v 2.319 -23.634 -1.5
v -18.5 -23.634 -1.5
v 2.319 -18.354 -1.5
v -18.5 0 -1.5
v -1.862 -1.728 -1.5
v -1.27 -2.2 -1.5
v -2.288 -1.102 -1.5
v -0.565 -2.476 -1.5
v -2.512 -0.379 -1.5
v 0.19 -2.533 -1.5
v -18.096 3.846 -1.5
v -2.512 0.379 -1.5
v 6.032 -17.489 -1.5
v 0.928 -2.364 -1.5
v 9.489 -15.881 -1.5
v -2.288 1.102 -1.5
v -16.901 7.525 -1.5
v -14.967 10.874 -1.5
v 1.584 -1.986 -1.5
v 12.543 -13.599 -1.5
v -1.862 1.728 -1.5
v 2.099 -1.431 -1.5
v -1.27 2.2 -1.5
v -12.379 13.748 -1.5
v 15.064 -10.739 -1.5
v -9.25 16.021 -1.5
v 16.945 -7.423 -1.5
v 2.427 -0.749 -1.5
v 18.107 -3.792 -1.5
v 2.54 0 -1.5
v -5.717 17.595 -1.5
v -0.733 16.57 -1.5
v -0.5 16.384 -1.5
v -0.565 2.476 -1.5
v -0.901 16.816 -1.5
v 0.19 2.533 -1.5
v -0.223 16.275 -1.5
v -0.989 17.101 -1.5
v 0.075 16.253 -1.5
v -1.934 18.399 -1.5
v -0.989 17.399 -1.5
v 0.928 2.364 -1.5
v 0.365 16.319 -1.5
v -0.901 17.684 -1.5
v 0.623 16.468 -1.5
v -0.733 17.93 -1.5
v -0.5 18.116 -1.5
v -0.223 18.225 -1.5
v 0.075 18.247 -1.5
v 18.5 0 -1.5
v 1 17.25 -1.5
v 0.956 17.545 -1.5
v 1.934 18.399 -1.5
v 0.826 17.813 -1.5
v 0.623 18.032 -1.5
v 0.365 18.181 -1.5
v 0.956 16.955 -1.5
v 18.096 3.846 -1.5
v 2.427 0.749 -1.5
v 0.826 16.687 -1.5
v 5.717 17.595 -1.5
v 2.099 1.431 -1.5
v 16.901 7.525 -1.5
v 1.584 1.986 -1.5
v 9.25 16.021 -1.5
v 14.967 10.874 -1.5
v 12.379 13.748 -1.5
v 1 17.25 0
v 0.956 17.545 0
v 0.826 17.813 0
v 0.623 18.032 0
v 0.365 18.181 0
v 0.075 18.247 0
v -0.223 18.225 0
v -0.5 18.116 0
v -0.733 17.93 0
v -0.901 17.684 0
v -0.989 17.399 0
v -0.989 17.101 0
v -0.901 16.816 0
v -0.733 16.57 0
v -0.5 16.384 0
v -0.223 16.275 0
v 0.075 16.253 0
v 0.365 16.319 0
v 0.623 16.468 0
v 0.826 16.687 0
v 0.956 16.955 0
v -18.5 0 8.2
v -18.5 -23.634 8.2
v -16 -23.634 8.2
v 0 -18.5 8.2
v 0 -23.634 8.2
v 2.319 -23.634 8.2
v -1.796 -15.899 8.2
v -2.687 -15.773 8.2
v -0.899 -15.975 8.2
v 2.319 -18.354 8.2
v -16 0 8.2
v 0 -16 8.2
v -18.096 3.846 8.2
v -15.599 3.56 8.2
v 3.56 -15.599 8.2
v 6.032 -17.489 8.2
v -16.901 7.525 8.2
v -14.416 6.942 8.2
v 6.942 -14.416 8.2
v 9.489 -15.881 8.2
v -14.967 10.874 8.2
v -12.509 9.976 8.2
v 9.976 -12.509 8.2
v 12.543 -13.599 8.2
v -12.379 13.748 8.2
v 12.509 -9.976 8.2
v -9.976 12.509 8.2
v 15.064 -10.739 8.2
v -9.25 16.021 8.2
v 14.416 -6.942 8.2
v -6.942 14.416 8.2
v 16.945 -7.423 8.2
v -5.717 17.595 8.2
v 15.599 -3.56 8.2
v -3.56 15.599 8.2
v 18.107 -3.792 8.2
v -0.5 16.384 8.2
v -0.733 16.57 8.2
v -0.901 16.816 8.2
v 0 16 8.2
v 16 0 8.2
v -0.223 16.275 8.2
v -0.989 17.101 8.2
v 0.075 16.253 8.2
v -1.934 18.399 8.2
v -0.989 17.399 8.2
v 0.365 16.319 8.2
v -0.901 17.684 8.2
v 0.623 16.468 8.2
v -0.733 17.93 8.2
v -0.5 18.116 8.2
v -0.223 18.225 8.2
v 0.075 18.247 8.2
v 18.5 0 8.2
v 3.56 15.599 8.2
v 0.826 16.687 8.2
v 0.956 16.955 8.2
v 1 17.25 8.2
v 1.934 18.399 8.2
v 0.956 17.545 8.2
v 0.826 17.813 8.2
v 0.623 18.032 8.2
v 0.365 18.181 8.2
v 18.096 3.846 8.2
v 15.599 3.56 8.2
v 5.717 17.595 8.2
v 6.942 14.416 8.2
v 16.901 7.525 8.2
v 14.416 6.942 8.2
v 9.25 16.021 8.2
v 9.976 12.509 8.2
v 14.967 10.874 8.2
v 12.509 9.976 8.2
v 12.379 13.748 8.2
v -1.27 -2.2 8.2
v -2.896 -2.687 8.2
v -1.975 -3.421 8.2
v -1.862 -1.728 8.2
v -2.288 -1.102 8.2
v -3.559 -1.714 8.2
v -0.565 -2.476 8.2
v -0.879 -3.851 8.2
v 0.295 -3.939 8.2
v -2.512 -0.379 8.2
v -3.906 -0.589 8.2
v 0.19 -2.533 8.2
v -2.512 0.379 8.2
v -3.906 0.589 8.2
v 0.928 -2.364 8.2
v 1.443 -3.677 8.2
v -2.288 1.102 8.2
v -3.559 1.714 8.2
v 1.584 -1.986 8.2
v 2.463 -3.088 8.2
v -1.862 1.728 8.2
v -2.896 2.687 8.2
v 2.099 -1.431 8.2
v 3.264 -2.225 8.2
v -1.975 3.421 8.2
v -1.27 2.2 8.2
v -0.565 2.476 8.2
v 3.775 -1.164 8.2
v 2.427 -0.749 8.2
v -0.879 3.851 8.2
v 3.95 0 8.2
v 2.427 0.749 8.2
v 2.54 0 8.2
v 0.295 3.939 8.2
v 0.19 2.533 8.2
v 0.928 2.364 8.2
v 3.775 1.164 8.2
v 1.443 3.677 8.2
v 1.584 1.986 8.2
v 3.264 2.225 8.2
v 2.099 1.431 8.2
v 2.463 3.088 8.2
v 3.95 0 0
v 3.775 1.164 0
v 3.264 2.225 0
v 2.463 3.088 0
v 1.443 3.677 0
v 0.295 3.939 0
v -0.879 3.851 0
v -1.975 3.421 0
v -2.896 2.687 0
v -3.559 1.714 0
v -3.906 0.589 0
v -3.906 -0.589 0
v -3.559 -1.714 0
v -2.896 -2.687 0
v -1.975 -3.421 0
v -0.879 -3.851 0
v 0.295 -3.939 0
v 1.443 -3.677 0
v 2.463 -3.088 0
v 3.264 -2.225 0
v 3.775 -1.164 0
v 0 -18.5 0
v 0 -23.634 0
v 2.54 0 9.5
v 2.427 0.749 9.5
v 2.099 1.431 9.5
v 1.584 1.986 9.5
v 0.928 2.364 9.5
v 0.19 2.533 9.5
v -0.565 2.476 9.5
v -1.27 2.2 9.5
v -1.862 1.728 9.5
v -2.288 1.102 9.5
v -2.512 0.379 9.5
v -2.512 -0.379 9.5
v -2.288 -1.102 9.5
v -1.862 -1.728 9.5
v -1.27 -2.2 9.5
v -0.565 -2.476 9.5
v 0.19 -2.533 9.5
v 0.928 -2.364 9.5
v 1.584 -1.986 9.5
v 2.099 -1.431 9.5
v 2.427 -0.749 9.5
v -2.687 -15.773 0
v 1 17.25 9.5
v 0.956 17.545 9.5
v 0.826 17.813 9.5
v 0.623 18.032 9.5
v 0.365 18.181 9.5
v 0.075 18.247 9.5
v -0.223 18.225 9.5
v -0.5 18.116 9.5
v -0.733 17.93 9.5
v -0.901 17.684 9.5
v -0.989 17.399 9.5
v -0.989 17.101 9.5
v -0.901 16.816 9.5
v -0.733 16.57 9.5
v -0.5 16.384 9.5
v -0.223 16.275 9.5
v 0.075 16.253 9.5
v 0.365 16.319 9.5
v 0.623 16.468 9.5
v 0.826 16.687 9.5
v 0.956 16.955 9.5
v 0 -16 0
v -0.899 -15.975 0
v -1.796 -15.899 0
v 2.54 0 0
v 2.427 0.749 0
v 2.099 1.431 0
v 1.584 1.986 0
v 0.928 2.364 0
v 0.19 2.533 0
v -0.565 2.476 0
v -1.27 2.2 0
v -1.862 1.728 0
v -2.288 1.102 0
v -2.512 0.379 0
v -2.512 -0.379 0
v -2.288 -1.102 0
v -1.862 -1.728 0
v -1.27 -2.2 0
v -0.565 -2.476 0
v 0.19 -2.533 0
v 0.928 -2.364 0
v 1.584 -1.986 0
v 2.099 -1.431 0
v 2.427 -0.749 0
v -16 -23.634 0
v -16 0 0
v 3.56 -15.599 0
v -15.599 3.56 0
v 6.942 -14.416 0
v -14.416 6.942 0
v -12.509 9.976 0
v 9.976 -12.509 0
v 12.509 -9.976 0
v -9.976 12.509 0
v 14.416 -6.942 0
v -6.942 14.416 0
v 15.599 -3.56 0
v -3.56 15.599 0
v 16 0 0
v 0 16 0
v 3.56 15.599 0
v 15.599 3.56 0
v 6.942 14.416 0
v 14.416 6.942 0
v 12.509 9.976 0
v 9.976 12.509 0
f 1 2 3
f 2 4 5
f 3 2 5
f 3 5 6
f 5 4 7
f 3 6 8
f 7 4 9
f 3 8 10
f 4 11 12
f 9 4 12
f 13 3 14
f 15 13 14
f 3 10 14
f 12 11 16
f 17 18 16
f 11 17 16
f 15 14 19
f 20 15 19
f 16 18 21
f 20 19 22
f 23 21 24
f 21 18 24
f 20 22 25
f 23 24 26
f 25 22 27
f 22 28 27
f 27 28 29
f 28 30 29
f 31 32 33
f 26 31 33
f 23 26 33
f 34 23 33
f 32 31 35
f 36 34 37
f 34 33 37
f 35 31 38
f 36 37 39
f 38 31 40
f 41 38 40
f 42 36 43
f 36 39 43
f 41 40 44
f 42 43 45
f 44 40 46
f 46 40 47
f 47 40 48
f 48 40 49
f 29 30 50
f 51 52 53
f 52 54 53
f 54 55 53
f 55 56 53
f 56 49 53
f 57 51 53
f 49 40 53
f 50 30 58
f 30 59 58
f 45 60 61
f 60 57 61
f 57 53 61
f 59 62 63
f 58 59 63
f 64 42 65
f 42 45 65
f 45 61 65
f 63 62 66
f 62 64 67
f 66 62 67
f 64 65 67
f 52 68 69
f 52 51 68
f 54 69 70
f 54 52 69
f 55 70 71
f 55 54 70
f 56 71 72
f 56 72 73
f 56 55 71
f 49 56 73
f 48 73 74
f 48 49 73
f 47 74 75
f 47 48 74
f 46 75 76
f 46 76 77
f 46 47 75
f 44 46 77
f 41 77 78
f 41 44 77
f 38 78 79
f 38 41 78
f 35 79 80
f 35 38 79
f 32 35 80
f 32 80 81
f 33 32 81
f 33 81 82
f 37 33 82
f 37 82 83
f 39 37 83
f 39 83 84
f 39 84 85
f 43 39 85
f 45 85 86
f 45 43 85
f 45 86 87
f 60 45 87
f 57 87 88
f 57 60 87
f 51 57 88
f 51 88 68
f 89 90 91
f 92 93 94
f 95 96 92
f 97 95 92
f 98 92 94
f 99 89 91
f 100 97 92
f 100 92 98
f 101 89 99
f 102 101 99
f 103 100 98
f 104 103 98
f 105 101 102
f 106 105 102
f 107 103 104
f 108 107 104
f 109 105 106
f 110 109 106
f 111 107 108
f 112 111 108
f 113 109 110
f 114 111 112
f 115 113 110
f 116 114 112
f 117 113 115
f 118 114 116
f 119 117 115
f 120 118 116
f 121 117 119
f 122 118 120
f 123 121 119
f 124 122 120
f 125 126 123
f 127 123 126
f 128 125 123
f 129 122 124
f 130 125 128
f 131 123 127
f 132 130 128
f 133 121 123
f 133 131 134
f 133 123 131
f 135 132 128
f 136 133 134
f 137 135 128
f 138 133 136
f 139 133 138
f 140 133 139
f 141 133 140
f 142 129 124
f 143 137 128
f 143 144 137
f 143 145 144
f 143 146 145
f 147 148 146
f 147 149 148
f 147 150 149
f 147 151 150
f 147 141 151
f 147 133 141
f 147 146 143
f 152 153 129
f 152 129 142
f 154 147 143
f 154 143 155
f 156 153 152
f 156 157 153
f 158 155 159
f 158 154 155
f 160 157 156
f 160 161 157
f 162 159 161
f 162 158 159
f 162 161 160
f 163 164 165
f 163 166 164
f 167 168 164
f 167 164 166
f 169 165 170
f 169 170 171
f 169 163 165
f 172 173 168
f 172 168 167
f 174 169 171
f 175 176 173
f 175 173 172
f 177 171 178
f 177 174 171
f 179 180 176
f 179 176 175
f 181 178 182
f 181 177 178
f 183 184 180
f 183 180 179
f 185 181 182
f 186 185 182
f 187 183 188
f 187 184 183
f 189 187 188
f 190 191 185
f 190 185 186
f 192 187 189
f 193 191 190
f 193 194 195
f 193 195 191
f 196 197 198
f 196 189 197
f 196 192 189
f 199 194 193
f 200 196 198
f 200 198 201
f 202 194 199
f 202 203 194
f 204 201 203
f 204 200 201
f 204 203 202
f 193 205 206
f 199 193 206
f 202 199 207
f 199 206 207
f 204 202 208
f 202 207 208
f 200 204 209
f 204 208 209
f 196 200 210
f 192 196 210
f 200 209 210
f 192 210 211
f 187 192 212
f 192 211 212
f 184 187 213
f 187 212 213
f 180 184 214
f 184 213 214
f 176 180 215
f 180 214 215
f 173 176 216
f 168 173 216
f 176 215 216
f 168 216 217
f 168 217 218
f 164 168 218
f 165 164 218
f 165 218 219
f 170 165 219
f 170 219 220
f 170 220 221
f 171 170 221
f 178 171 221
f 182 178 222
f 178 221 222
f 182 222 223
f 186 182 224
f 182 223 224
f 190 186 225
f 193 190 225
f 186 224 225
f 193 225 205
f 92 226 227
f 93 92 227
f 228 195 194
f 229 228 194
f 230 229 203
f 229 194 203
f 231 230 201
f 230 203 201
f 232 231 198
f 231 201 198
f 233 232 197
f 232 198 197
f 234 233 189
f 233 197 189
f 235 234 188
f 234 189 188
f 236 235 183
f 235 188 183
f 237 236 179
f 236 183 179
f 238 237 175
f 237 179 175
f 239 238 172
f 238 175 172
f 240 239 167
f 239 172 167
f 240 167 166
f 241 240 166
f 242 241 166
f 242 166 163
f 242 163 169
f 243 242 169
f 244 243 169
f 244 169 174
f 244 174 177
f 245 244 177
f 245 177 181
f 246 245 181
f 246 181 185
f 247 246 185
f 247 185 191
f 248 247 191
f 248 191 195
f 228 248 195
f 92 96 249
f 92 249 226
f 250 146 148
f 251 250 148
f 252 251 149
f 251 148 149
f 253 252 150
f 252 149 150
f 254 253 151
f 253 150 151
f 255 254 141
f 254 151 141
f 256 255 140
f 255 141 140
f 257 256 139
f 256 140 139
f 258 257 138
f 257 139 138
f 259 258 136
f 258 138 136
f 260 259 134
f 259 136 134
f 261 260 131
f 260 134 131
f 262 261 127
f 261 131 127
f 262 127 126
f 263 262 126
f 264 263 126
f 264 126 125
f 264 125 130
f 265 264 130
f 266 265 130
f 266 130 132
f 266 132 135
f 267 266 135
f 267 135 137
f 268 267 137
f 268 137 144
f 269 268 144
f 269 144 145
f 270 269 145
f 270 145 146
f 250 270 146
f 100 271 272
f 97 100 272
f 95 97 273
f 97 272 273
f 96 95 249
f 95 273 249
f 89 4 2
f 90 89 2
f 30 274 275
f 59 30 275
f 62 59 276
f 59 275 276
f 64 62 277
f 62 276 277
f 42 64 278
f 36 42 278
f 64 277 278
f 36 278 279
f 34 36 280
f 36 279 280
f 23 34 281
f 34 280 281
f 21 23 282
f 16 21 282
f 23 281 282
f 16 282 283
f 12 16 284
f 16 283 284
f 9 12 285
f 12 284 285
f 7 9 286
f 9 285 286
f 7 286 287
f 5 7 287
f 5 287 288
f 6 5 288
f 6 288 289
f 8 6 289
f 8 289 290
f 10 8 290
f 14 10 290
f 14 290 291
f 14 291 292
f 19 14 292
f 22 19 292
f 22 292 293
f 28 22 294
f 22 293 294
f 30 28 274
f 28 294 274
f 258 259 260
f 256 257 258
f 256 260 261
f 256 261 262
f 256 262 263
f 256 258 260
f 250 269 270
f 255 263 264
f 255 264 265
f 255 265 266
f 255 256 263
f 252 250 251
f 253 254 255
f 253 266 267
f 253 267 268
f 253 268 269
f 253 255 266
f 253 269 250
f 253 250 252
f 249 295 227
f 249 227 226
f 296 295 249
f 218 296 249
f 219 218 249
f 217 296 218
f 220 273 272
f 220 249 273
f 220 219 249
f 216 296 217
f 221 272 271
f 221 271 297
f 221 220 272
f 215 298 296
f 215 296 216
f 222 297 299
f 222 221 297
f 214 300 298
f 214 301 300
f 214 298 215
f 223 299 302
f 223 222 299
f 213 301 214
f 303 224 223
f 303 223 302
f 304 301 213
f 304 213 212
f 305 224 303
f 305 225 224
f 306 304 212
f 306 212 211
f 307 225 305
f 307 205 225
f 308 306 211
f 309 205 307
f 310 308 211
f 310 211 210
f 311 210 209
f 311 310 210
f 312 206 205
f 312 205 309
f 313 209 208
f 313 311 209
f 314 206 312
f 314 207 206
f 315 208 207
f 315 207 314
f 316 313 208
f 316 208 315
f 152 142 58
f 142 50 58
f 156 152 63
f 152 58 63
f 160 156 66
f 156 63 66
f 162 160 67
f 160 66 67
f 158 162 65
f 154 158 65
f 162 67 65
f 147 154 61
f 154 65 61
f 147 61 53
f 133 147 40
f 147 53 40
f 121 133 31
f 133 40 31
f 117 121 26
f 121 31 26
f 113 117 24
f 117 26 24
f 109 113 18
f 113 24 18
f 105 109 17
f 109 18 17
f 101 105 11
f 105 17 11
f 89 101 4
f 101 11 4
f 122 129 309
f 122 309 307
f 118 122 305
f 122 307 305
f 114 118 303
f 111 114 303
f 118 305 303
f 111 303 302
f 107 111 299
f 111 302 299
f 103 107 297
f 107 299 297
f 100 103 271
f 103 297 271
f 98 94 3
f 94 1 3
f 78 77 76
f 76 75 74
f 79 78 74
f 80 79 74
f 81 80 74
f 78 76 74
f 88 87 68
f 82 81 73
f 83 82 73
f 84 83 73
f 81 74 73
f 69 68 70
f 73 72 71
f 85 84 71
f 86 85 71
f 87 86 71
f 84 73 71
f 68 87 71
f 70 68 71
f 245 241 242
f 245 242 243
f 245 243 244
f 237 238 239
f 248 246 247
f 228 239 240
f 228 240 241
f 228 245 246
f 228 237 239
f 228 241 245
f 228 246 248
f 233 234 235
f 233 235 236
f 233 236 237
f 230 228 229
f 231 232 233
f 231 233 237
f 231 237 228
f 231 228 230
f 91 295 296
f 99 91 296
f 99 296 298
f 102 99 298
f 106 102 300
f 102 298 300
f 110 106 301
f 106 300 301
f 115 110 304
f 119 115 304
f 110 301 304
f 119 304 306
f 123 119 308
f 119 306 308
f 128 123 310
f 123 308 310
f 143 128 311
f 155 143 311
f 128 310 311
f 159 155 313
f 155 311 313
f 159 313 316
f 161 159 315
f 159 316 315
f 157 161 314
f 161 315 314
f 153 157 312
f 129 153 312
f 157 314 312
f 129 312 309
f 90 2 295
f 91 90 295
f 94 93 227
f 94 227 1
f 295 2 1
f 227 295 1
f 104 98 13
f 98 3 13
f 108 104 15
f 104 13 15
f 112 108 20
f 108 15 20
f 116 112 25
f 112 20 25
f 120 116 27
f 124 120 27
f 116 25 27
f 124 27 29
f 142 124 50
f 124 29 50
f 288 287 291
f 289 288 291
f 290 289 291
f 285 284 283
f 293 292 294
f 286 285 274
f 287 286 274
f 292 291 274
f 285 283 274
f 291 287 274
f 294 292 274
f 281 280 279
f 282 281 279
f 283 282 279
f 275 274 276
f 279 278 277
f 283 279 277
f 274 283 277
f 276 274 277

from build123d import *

# Parameters (mm, degrees)
F0_R     = 3.95
F0_R_2   = 2.54
F0_R_3   = 1
F1_DEPTH = 1.5
F2_DEPTH = 8.2
F3_DEPTH = 9.5


with BuildPart() as f1:
    # F0 (on Top) → F1 (new body)
    with BuildSketch(Plane.XY):
        with BuildLine():
            Line((2.319022, -18.354077), (0, -16))
            ThreePointArc((0, -16), (-1.348069, -15.943109), (-2.686551, -15.772839))
            Line((-2.686551, -15.772839), (0, -18.5))
            ThreePointArc((0, -18.5), (1.161804, -18.463483), (2.319022, -18.354077))
        make_face()
        with BuildLine():
            ThreePointArc((0, -18.5), (-9.231437, -16.032173), (-16, -9.287088))
            Line((-16, -9.287088), (-16, -23.633545))
            Line((-16, -23.633545), (0, -23.633545))
            Line((0, -23.633545), (0, -20.048685))
            Line((0, -20.048685), (0, -18.5))
        make_face()
        with BuildLine():
            ThreePointArc((-2.686551, -15.772839), (-12.226709, -10.320251), (-16, 0))
            Line((-16, 0), (-16, -9.287088))
            ThreePointArc((-16, -9.287088), (-9.231437, -16.032173), (0, -18.5))
            Line((0, -18.5), (-2.686551, -15.772839))
        make_face()
        with BuildLine():
            ThreePointArc((0, -16), (11.313708, -11.313708), (16, 0))
            ThreePointArc((16, 0), (0, 16), (-16, 0))
            ThreePointArc((-16, 0), (-12.226709, -10.320251), (-2.686551, -15.772839))
            ThreePointArc((-2.686551, -15.772839), (-1.348069, -15.943109), (0, -16))
        make_face()
        Circle(F0_R, mode=Mode.SUBTRACT)
        Circle(F0_R)
        Circle(F0_R_2, mode=Mode.SUBTRACT)
        with BuildLine():
            ThreePointArc((-16, 0), (0, 16), (16, 0))
            ThreePointArc((16, 0), (11.313708, -11.313708), (0, -16))
            Line((0, -16), (2.319022, -18.354077))
            ThreePointArc((2.319022, -18.354077), (13.877174, -12.234134), (18.5, 0))
            ThreePointArc((18.5, 0), (0, 18.5), (-18.5, 0))
            Line((-18.5, 0), (-16, 0))
        make_face()
        with Locations((0, 17.25)):
            Circle(F0_R_3, mode=Mode.SUBTRACT)
        with BuildLine():
            Line((-16, -9.287088), (-16, 0))
            Line((-16, 0), (-18.5, 0))
            ThreePointArc((-18.5, 0), (-17.86407, -4.808846), (-16, -9.287088))
        make_face()
        with BuildLine():
            Line((-16, -23.633545), (-16, -9.287088))
            ThreePointArc((-16, -9.287088), (-17.86407, -4.808846), (-18.5, 0))
            Line((-18.5, 0), (-18.5, -23.633545))
            Line((-18.5, -23.633545), (-16, -23.633545))
        make_face()
        with BuildLine():
            Line((2.319022, -23.633545), (2.319022, -18.354077))
            ThreePointArc((2.319022, -18.354077), (1.161804, -18.463483), (0, -18.5))
            Line((0, -18.5), (0, -20.048685))
            Line((0, -20.048685), (0, -23.633545))
            Line((0, -23.633545), (2.319022, -23.633545))
        make_face()
    extrude(amount=-F1_DEPTH)

    # F0 (on Top) → F2 (join)
    with BuildSketch(Plane.XY):
        with BuildLine():
            Line((-16, -23.633545), (-16, -9.287088))
            ThreePointArc((-16, -9.287088), (-17.86407, -4.808846), (-18.5, 0))
            Line((-18.5, 0), (-18.5, -23.633545))
            Line((-18.5, -23.633545), (-16, -23.633545))
        make_face()
        with BuildLine():
            Line((-16, -9.287088), (-16, 0))
            Line((-16, 0), (-18.5, 0))
            ThreePointArc((-18.5, 0), (-17.86407, -4.808846), (-16, -9.287088))
        make_face()
        with BuildLine():
            ThreePointArc((-16, 0), (0, 16), (16, 0))
            ThreePointArc((16, 0), (11.313708, -11.313708), (0, -16))
            Line((0, -16), (2.319022, -18.354077))
            ThreePointArc((2.319022, -18.354077), (13.877174, -12.234134), (18.5, 0))
            ThreePointArc((18.5, 0), (0, 18.5), (-18.5, 0))
            Line((-18.5, 0), (-16, 0))
        make_face()
        with Locations((0, 17.25)):
            Circle(F0_R_3, mode=Mode.SUBTRACT)
        with BuildLine():
            Line((2.319022, -23.633545), (2.319022, -18.354077))
            ThreePointArc((2.319022, -18.354077), (1.161804, -18.463483), (0, -18.5))
            Line((0, -18.5), (0, -20.048685))
            Line((0, -20.048685), (0, -23.633545))
            Line((0, -23.633545), (2.319022, -23.633545))
        make_face()
        with BuildLine():
            Line((2.319022, -18.354077), (0, -16))
            ThreePointArc((0, -16), (-1.348069, -15.943109), (-2.686551, -15.772839))
            Line((-2.686551, -15.772839), (0, -18.5))
            ThreePointArc((0, -18.5), (1.161804, -18.463483), (2.319022, -18.354077))
        make_face()
        Circle(F0_R)
        Circle(F0_R_2, mode=Mode.SUBTRACT)
    extrude(amount=F2_DEPTH)

    # F0 (on Top) → F3 (join)
    with BuildSketch(Plane.XY):
        with Locations((0, 17.25)):
            Circle(F0_R_3)
        Circle(F0_R_2)
    extrude(amount=F3_DEPTH)


solid = f1.part
